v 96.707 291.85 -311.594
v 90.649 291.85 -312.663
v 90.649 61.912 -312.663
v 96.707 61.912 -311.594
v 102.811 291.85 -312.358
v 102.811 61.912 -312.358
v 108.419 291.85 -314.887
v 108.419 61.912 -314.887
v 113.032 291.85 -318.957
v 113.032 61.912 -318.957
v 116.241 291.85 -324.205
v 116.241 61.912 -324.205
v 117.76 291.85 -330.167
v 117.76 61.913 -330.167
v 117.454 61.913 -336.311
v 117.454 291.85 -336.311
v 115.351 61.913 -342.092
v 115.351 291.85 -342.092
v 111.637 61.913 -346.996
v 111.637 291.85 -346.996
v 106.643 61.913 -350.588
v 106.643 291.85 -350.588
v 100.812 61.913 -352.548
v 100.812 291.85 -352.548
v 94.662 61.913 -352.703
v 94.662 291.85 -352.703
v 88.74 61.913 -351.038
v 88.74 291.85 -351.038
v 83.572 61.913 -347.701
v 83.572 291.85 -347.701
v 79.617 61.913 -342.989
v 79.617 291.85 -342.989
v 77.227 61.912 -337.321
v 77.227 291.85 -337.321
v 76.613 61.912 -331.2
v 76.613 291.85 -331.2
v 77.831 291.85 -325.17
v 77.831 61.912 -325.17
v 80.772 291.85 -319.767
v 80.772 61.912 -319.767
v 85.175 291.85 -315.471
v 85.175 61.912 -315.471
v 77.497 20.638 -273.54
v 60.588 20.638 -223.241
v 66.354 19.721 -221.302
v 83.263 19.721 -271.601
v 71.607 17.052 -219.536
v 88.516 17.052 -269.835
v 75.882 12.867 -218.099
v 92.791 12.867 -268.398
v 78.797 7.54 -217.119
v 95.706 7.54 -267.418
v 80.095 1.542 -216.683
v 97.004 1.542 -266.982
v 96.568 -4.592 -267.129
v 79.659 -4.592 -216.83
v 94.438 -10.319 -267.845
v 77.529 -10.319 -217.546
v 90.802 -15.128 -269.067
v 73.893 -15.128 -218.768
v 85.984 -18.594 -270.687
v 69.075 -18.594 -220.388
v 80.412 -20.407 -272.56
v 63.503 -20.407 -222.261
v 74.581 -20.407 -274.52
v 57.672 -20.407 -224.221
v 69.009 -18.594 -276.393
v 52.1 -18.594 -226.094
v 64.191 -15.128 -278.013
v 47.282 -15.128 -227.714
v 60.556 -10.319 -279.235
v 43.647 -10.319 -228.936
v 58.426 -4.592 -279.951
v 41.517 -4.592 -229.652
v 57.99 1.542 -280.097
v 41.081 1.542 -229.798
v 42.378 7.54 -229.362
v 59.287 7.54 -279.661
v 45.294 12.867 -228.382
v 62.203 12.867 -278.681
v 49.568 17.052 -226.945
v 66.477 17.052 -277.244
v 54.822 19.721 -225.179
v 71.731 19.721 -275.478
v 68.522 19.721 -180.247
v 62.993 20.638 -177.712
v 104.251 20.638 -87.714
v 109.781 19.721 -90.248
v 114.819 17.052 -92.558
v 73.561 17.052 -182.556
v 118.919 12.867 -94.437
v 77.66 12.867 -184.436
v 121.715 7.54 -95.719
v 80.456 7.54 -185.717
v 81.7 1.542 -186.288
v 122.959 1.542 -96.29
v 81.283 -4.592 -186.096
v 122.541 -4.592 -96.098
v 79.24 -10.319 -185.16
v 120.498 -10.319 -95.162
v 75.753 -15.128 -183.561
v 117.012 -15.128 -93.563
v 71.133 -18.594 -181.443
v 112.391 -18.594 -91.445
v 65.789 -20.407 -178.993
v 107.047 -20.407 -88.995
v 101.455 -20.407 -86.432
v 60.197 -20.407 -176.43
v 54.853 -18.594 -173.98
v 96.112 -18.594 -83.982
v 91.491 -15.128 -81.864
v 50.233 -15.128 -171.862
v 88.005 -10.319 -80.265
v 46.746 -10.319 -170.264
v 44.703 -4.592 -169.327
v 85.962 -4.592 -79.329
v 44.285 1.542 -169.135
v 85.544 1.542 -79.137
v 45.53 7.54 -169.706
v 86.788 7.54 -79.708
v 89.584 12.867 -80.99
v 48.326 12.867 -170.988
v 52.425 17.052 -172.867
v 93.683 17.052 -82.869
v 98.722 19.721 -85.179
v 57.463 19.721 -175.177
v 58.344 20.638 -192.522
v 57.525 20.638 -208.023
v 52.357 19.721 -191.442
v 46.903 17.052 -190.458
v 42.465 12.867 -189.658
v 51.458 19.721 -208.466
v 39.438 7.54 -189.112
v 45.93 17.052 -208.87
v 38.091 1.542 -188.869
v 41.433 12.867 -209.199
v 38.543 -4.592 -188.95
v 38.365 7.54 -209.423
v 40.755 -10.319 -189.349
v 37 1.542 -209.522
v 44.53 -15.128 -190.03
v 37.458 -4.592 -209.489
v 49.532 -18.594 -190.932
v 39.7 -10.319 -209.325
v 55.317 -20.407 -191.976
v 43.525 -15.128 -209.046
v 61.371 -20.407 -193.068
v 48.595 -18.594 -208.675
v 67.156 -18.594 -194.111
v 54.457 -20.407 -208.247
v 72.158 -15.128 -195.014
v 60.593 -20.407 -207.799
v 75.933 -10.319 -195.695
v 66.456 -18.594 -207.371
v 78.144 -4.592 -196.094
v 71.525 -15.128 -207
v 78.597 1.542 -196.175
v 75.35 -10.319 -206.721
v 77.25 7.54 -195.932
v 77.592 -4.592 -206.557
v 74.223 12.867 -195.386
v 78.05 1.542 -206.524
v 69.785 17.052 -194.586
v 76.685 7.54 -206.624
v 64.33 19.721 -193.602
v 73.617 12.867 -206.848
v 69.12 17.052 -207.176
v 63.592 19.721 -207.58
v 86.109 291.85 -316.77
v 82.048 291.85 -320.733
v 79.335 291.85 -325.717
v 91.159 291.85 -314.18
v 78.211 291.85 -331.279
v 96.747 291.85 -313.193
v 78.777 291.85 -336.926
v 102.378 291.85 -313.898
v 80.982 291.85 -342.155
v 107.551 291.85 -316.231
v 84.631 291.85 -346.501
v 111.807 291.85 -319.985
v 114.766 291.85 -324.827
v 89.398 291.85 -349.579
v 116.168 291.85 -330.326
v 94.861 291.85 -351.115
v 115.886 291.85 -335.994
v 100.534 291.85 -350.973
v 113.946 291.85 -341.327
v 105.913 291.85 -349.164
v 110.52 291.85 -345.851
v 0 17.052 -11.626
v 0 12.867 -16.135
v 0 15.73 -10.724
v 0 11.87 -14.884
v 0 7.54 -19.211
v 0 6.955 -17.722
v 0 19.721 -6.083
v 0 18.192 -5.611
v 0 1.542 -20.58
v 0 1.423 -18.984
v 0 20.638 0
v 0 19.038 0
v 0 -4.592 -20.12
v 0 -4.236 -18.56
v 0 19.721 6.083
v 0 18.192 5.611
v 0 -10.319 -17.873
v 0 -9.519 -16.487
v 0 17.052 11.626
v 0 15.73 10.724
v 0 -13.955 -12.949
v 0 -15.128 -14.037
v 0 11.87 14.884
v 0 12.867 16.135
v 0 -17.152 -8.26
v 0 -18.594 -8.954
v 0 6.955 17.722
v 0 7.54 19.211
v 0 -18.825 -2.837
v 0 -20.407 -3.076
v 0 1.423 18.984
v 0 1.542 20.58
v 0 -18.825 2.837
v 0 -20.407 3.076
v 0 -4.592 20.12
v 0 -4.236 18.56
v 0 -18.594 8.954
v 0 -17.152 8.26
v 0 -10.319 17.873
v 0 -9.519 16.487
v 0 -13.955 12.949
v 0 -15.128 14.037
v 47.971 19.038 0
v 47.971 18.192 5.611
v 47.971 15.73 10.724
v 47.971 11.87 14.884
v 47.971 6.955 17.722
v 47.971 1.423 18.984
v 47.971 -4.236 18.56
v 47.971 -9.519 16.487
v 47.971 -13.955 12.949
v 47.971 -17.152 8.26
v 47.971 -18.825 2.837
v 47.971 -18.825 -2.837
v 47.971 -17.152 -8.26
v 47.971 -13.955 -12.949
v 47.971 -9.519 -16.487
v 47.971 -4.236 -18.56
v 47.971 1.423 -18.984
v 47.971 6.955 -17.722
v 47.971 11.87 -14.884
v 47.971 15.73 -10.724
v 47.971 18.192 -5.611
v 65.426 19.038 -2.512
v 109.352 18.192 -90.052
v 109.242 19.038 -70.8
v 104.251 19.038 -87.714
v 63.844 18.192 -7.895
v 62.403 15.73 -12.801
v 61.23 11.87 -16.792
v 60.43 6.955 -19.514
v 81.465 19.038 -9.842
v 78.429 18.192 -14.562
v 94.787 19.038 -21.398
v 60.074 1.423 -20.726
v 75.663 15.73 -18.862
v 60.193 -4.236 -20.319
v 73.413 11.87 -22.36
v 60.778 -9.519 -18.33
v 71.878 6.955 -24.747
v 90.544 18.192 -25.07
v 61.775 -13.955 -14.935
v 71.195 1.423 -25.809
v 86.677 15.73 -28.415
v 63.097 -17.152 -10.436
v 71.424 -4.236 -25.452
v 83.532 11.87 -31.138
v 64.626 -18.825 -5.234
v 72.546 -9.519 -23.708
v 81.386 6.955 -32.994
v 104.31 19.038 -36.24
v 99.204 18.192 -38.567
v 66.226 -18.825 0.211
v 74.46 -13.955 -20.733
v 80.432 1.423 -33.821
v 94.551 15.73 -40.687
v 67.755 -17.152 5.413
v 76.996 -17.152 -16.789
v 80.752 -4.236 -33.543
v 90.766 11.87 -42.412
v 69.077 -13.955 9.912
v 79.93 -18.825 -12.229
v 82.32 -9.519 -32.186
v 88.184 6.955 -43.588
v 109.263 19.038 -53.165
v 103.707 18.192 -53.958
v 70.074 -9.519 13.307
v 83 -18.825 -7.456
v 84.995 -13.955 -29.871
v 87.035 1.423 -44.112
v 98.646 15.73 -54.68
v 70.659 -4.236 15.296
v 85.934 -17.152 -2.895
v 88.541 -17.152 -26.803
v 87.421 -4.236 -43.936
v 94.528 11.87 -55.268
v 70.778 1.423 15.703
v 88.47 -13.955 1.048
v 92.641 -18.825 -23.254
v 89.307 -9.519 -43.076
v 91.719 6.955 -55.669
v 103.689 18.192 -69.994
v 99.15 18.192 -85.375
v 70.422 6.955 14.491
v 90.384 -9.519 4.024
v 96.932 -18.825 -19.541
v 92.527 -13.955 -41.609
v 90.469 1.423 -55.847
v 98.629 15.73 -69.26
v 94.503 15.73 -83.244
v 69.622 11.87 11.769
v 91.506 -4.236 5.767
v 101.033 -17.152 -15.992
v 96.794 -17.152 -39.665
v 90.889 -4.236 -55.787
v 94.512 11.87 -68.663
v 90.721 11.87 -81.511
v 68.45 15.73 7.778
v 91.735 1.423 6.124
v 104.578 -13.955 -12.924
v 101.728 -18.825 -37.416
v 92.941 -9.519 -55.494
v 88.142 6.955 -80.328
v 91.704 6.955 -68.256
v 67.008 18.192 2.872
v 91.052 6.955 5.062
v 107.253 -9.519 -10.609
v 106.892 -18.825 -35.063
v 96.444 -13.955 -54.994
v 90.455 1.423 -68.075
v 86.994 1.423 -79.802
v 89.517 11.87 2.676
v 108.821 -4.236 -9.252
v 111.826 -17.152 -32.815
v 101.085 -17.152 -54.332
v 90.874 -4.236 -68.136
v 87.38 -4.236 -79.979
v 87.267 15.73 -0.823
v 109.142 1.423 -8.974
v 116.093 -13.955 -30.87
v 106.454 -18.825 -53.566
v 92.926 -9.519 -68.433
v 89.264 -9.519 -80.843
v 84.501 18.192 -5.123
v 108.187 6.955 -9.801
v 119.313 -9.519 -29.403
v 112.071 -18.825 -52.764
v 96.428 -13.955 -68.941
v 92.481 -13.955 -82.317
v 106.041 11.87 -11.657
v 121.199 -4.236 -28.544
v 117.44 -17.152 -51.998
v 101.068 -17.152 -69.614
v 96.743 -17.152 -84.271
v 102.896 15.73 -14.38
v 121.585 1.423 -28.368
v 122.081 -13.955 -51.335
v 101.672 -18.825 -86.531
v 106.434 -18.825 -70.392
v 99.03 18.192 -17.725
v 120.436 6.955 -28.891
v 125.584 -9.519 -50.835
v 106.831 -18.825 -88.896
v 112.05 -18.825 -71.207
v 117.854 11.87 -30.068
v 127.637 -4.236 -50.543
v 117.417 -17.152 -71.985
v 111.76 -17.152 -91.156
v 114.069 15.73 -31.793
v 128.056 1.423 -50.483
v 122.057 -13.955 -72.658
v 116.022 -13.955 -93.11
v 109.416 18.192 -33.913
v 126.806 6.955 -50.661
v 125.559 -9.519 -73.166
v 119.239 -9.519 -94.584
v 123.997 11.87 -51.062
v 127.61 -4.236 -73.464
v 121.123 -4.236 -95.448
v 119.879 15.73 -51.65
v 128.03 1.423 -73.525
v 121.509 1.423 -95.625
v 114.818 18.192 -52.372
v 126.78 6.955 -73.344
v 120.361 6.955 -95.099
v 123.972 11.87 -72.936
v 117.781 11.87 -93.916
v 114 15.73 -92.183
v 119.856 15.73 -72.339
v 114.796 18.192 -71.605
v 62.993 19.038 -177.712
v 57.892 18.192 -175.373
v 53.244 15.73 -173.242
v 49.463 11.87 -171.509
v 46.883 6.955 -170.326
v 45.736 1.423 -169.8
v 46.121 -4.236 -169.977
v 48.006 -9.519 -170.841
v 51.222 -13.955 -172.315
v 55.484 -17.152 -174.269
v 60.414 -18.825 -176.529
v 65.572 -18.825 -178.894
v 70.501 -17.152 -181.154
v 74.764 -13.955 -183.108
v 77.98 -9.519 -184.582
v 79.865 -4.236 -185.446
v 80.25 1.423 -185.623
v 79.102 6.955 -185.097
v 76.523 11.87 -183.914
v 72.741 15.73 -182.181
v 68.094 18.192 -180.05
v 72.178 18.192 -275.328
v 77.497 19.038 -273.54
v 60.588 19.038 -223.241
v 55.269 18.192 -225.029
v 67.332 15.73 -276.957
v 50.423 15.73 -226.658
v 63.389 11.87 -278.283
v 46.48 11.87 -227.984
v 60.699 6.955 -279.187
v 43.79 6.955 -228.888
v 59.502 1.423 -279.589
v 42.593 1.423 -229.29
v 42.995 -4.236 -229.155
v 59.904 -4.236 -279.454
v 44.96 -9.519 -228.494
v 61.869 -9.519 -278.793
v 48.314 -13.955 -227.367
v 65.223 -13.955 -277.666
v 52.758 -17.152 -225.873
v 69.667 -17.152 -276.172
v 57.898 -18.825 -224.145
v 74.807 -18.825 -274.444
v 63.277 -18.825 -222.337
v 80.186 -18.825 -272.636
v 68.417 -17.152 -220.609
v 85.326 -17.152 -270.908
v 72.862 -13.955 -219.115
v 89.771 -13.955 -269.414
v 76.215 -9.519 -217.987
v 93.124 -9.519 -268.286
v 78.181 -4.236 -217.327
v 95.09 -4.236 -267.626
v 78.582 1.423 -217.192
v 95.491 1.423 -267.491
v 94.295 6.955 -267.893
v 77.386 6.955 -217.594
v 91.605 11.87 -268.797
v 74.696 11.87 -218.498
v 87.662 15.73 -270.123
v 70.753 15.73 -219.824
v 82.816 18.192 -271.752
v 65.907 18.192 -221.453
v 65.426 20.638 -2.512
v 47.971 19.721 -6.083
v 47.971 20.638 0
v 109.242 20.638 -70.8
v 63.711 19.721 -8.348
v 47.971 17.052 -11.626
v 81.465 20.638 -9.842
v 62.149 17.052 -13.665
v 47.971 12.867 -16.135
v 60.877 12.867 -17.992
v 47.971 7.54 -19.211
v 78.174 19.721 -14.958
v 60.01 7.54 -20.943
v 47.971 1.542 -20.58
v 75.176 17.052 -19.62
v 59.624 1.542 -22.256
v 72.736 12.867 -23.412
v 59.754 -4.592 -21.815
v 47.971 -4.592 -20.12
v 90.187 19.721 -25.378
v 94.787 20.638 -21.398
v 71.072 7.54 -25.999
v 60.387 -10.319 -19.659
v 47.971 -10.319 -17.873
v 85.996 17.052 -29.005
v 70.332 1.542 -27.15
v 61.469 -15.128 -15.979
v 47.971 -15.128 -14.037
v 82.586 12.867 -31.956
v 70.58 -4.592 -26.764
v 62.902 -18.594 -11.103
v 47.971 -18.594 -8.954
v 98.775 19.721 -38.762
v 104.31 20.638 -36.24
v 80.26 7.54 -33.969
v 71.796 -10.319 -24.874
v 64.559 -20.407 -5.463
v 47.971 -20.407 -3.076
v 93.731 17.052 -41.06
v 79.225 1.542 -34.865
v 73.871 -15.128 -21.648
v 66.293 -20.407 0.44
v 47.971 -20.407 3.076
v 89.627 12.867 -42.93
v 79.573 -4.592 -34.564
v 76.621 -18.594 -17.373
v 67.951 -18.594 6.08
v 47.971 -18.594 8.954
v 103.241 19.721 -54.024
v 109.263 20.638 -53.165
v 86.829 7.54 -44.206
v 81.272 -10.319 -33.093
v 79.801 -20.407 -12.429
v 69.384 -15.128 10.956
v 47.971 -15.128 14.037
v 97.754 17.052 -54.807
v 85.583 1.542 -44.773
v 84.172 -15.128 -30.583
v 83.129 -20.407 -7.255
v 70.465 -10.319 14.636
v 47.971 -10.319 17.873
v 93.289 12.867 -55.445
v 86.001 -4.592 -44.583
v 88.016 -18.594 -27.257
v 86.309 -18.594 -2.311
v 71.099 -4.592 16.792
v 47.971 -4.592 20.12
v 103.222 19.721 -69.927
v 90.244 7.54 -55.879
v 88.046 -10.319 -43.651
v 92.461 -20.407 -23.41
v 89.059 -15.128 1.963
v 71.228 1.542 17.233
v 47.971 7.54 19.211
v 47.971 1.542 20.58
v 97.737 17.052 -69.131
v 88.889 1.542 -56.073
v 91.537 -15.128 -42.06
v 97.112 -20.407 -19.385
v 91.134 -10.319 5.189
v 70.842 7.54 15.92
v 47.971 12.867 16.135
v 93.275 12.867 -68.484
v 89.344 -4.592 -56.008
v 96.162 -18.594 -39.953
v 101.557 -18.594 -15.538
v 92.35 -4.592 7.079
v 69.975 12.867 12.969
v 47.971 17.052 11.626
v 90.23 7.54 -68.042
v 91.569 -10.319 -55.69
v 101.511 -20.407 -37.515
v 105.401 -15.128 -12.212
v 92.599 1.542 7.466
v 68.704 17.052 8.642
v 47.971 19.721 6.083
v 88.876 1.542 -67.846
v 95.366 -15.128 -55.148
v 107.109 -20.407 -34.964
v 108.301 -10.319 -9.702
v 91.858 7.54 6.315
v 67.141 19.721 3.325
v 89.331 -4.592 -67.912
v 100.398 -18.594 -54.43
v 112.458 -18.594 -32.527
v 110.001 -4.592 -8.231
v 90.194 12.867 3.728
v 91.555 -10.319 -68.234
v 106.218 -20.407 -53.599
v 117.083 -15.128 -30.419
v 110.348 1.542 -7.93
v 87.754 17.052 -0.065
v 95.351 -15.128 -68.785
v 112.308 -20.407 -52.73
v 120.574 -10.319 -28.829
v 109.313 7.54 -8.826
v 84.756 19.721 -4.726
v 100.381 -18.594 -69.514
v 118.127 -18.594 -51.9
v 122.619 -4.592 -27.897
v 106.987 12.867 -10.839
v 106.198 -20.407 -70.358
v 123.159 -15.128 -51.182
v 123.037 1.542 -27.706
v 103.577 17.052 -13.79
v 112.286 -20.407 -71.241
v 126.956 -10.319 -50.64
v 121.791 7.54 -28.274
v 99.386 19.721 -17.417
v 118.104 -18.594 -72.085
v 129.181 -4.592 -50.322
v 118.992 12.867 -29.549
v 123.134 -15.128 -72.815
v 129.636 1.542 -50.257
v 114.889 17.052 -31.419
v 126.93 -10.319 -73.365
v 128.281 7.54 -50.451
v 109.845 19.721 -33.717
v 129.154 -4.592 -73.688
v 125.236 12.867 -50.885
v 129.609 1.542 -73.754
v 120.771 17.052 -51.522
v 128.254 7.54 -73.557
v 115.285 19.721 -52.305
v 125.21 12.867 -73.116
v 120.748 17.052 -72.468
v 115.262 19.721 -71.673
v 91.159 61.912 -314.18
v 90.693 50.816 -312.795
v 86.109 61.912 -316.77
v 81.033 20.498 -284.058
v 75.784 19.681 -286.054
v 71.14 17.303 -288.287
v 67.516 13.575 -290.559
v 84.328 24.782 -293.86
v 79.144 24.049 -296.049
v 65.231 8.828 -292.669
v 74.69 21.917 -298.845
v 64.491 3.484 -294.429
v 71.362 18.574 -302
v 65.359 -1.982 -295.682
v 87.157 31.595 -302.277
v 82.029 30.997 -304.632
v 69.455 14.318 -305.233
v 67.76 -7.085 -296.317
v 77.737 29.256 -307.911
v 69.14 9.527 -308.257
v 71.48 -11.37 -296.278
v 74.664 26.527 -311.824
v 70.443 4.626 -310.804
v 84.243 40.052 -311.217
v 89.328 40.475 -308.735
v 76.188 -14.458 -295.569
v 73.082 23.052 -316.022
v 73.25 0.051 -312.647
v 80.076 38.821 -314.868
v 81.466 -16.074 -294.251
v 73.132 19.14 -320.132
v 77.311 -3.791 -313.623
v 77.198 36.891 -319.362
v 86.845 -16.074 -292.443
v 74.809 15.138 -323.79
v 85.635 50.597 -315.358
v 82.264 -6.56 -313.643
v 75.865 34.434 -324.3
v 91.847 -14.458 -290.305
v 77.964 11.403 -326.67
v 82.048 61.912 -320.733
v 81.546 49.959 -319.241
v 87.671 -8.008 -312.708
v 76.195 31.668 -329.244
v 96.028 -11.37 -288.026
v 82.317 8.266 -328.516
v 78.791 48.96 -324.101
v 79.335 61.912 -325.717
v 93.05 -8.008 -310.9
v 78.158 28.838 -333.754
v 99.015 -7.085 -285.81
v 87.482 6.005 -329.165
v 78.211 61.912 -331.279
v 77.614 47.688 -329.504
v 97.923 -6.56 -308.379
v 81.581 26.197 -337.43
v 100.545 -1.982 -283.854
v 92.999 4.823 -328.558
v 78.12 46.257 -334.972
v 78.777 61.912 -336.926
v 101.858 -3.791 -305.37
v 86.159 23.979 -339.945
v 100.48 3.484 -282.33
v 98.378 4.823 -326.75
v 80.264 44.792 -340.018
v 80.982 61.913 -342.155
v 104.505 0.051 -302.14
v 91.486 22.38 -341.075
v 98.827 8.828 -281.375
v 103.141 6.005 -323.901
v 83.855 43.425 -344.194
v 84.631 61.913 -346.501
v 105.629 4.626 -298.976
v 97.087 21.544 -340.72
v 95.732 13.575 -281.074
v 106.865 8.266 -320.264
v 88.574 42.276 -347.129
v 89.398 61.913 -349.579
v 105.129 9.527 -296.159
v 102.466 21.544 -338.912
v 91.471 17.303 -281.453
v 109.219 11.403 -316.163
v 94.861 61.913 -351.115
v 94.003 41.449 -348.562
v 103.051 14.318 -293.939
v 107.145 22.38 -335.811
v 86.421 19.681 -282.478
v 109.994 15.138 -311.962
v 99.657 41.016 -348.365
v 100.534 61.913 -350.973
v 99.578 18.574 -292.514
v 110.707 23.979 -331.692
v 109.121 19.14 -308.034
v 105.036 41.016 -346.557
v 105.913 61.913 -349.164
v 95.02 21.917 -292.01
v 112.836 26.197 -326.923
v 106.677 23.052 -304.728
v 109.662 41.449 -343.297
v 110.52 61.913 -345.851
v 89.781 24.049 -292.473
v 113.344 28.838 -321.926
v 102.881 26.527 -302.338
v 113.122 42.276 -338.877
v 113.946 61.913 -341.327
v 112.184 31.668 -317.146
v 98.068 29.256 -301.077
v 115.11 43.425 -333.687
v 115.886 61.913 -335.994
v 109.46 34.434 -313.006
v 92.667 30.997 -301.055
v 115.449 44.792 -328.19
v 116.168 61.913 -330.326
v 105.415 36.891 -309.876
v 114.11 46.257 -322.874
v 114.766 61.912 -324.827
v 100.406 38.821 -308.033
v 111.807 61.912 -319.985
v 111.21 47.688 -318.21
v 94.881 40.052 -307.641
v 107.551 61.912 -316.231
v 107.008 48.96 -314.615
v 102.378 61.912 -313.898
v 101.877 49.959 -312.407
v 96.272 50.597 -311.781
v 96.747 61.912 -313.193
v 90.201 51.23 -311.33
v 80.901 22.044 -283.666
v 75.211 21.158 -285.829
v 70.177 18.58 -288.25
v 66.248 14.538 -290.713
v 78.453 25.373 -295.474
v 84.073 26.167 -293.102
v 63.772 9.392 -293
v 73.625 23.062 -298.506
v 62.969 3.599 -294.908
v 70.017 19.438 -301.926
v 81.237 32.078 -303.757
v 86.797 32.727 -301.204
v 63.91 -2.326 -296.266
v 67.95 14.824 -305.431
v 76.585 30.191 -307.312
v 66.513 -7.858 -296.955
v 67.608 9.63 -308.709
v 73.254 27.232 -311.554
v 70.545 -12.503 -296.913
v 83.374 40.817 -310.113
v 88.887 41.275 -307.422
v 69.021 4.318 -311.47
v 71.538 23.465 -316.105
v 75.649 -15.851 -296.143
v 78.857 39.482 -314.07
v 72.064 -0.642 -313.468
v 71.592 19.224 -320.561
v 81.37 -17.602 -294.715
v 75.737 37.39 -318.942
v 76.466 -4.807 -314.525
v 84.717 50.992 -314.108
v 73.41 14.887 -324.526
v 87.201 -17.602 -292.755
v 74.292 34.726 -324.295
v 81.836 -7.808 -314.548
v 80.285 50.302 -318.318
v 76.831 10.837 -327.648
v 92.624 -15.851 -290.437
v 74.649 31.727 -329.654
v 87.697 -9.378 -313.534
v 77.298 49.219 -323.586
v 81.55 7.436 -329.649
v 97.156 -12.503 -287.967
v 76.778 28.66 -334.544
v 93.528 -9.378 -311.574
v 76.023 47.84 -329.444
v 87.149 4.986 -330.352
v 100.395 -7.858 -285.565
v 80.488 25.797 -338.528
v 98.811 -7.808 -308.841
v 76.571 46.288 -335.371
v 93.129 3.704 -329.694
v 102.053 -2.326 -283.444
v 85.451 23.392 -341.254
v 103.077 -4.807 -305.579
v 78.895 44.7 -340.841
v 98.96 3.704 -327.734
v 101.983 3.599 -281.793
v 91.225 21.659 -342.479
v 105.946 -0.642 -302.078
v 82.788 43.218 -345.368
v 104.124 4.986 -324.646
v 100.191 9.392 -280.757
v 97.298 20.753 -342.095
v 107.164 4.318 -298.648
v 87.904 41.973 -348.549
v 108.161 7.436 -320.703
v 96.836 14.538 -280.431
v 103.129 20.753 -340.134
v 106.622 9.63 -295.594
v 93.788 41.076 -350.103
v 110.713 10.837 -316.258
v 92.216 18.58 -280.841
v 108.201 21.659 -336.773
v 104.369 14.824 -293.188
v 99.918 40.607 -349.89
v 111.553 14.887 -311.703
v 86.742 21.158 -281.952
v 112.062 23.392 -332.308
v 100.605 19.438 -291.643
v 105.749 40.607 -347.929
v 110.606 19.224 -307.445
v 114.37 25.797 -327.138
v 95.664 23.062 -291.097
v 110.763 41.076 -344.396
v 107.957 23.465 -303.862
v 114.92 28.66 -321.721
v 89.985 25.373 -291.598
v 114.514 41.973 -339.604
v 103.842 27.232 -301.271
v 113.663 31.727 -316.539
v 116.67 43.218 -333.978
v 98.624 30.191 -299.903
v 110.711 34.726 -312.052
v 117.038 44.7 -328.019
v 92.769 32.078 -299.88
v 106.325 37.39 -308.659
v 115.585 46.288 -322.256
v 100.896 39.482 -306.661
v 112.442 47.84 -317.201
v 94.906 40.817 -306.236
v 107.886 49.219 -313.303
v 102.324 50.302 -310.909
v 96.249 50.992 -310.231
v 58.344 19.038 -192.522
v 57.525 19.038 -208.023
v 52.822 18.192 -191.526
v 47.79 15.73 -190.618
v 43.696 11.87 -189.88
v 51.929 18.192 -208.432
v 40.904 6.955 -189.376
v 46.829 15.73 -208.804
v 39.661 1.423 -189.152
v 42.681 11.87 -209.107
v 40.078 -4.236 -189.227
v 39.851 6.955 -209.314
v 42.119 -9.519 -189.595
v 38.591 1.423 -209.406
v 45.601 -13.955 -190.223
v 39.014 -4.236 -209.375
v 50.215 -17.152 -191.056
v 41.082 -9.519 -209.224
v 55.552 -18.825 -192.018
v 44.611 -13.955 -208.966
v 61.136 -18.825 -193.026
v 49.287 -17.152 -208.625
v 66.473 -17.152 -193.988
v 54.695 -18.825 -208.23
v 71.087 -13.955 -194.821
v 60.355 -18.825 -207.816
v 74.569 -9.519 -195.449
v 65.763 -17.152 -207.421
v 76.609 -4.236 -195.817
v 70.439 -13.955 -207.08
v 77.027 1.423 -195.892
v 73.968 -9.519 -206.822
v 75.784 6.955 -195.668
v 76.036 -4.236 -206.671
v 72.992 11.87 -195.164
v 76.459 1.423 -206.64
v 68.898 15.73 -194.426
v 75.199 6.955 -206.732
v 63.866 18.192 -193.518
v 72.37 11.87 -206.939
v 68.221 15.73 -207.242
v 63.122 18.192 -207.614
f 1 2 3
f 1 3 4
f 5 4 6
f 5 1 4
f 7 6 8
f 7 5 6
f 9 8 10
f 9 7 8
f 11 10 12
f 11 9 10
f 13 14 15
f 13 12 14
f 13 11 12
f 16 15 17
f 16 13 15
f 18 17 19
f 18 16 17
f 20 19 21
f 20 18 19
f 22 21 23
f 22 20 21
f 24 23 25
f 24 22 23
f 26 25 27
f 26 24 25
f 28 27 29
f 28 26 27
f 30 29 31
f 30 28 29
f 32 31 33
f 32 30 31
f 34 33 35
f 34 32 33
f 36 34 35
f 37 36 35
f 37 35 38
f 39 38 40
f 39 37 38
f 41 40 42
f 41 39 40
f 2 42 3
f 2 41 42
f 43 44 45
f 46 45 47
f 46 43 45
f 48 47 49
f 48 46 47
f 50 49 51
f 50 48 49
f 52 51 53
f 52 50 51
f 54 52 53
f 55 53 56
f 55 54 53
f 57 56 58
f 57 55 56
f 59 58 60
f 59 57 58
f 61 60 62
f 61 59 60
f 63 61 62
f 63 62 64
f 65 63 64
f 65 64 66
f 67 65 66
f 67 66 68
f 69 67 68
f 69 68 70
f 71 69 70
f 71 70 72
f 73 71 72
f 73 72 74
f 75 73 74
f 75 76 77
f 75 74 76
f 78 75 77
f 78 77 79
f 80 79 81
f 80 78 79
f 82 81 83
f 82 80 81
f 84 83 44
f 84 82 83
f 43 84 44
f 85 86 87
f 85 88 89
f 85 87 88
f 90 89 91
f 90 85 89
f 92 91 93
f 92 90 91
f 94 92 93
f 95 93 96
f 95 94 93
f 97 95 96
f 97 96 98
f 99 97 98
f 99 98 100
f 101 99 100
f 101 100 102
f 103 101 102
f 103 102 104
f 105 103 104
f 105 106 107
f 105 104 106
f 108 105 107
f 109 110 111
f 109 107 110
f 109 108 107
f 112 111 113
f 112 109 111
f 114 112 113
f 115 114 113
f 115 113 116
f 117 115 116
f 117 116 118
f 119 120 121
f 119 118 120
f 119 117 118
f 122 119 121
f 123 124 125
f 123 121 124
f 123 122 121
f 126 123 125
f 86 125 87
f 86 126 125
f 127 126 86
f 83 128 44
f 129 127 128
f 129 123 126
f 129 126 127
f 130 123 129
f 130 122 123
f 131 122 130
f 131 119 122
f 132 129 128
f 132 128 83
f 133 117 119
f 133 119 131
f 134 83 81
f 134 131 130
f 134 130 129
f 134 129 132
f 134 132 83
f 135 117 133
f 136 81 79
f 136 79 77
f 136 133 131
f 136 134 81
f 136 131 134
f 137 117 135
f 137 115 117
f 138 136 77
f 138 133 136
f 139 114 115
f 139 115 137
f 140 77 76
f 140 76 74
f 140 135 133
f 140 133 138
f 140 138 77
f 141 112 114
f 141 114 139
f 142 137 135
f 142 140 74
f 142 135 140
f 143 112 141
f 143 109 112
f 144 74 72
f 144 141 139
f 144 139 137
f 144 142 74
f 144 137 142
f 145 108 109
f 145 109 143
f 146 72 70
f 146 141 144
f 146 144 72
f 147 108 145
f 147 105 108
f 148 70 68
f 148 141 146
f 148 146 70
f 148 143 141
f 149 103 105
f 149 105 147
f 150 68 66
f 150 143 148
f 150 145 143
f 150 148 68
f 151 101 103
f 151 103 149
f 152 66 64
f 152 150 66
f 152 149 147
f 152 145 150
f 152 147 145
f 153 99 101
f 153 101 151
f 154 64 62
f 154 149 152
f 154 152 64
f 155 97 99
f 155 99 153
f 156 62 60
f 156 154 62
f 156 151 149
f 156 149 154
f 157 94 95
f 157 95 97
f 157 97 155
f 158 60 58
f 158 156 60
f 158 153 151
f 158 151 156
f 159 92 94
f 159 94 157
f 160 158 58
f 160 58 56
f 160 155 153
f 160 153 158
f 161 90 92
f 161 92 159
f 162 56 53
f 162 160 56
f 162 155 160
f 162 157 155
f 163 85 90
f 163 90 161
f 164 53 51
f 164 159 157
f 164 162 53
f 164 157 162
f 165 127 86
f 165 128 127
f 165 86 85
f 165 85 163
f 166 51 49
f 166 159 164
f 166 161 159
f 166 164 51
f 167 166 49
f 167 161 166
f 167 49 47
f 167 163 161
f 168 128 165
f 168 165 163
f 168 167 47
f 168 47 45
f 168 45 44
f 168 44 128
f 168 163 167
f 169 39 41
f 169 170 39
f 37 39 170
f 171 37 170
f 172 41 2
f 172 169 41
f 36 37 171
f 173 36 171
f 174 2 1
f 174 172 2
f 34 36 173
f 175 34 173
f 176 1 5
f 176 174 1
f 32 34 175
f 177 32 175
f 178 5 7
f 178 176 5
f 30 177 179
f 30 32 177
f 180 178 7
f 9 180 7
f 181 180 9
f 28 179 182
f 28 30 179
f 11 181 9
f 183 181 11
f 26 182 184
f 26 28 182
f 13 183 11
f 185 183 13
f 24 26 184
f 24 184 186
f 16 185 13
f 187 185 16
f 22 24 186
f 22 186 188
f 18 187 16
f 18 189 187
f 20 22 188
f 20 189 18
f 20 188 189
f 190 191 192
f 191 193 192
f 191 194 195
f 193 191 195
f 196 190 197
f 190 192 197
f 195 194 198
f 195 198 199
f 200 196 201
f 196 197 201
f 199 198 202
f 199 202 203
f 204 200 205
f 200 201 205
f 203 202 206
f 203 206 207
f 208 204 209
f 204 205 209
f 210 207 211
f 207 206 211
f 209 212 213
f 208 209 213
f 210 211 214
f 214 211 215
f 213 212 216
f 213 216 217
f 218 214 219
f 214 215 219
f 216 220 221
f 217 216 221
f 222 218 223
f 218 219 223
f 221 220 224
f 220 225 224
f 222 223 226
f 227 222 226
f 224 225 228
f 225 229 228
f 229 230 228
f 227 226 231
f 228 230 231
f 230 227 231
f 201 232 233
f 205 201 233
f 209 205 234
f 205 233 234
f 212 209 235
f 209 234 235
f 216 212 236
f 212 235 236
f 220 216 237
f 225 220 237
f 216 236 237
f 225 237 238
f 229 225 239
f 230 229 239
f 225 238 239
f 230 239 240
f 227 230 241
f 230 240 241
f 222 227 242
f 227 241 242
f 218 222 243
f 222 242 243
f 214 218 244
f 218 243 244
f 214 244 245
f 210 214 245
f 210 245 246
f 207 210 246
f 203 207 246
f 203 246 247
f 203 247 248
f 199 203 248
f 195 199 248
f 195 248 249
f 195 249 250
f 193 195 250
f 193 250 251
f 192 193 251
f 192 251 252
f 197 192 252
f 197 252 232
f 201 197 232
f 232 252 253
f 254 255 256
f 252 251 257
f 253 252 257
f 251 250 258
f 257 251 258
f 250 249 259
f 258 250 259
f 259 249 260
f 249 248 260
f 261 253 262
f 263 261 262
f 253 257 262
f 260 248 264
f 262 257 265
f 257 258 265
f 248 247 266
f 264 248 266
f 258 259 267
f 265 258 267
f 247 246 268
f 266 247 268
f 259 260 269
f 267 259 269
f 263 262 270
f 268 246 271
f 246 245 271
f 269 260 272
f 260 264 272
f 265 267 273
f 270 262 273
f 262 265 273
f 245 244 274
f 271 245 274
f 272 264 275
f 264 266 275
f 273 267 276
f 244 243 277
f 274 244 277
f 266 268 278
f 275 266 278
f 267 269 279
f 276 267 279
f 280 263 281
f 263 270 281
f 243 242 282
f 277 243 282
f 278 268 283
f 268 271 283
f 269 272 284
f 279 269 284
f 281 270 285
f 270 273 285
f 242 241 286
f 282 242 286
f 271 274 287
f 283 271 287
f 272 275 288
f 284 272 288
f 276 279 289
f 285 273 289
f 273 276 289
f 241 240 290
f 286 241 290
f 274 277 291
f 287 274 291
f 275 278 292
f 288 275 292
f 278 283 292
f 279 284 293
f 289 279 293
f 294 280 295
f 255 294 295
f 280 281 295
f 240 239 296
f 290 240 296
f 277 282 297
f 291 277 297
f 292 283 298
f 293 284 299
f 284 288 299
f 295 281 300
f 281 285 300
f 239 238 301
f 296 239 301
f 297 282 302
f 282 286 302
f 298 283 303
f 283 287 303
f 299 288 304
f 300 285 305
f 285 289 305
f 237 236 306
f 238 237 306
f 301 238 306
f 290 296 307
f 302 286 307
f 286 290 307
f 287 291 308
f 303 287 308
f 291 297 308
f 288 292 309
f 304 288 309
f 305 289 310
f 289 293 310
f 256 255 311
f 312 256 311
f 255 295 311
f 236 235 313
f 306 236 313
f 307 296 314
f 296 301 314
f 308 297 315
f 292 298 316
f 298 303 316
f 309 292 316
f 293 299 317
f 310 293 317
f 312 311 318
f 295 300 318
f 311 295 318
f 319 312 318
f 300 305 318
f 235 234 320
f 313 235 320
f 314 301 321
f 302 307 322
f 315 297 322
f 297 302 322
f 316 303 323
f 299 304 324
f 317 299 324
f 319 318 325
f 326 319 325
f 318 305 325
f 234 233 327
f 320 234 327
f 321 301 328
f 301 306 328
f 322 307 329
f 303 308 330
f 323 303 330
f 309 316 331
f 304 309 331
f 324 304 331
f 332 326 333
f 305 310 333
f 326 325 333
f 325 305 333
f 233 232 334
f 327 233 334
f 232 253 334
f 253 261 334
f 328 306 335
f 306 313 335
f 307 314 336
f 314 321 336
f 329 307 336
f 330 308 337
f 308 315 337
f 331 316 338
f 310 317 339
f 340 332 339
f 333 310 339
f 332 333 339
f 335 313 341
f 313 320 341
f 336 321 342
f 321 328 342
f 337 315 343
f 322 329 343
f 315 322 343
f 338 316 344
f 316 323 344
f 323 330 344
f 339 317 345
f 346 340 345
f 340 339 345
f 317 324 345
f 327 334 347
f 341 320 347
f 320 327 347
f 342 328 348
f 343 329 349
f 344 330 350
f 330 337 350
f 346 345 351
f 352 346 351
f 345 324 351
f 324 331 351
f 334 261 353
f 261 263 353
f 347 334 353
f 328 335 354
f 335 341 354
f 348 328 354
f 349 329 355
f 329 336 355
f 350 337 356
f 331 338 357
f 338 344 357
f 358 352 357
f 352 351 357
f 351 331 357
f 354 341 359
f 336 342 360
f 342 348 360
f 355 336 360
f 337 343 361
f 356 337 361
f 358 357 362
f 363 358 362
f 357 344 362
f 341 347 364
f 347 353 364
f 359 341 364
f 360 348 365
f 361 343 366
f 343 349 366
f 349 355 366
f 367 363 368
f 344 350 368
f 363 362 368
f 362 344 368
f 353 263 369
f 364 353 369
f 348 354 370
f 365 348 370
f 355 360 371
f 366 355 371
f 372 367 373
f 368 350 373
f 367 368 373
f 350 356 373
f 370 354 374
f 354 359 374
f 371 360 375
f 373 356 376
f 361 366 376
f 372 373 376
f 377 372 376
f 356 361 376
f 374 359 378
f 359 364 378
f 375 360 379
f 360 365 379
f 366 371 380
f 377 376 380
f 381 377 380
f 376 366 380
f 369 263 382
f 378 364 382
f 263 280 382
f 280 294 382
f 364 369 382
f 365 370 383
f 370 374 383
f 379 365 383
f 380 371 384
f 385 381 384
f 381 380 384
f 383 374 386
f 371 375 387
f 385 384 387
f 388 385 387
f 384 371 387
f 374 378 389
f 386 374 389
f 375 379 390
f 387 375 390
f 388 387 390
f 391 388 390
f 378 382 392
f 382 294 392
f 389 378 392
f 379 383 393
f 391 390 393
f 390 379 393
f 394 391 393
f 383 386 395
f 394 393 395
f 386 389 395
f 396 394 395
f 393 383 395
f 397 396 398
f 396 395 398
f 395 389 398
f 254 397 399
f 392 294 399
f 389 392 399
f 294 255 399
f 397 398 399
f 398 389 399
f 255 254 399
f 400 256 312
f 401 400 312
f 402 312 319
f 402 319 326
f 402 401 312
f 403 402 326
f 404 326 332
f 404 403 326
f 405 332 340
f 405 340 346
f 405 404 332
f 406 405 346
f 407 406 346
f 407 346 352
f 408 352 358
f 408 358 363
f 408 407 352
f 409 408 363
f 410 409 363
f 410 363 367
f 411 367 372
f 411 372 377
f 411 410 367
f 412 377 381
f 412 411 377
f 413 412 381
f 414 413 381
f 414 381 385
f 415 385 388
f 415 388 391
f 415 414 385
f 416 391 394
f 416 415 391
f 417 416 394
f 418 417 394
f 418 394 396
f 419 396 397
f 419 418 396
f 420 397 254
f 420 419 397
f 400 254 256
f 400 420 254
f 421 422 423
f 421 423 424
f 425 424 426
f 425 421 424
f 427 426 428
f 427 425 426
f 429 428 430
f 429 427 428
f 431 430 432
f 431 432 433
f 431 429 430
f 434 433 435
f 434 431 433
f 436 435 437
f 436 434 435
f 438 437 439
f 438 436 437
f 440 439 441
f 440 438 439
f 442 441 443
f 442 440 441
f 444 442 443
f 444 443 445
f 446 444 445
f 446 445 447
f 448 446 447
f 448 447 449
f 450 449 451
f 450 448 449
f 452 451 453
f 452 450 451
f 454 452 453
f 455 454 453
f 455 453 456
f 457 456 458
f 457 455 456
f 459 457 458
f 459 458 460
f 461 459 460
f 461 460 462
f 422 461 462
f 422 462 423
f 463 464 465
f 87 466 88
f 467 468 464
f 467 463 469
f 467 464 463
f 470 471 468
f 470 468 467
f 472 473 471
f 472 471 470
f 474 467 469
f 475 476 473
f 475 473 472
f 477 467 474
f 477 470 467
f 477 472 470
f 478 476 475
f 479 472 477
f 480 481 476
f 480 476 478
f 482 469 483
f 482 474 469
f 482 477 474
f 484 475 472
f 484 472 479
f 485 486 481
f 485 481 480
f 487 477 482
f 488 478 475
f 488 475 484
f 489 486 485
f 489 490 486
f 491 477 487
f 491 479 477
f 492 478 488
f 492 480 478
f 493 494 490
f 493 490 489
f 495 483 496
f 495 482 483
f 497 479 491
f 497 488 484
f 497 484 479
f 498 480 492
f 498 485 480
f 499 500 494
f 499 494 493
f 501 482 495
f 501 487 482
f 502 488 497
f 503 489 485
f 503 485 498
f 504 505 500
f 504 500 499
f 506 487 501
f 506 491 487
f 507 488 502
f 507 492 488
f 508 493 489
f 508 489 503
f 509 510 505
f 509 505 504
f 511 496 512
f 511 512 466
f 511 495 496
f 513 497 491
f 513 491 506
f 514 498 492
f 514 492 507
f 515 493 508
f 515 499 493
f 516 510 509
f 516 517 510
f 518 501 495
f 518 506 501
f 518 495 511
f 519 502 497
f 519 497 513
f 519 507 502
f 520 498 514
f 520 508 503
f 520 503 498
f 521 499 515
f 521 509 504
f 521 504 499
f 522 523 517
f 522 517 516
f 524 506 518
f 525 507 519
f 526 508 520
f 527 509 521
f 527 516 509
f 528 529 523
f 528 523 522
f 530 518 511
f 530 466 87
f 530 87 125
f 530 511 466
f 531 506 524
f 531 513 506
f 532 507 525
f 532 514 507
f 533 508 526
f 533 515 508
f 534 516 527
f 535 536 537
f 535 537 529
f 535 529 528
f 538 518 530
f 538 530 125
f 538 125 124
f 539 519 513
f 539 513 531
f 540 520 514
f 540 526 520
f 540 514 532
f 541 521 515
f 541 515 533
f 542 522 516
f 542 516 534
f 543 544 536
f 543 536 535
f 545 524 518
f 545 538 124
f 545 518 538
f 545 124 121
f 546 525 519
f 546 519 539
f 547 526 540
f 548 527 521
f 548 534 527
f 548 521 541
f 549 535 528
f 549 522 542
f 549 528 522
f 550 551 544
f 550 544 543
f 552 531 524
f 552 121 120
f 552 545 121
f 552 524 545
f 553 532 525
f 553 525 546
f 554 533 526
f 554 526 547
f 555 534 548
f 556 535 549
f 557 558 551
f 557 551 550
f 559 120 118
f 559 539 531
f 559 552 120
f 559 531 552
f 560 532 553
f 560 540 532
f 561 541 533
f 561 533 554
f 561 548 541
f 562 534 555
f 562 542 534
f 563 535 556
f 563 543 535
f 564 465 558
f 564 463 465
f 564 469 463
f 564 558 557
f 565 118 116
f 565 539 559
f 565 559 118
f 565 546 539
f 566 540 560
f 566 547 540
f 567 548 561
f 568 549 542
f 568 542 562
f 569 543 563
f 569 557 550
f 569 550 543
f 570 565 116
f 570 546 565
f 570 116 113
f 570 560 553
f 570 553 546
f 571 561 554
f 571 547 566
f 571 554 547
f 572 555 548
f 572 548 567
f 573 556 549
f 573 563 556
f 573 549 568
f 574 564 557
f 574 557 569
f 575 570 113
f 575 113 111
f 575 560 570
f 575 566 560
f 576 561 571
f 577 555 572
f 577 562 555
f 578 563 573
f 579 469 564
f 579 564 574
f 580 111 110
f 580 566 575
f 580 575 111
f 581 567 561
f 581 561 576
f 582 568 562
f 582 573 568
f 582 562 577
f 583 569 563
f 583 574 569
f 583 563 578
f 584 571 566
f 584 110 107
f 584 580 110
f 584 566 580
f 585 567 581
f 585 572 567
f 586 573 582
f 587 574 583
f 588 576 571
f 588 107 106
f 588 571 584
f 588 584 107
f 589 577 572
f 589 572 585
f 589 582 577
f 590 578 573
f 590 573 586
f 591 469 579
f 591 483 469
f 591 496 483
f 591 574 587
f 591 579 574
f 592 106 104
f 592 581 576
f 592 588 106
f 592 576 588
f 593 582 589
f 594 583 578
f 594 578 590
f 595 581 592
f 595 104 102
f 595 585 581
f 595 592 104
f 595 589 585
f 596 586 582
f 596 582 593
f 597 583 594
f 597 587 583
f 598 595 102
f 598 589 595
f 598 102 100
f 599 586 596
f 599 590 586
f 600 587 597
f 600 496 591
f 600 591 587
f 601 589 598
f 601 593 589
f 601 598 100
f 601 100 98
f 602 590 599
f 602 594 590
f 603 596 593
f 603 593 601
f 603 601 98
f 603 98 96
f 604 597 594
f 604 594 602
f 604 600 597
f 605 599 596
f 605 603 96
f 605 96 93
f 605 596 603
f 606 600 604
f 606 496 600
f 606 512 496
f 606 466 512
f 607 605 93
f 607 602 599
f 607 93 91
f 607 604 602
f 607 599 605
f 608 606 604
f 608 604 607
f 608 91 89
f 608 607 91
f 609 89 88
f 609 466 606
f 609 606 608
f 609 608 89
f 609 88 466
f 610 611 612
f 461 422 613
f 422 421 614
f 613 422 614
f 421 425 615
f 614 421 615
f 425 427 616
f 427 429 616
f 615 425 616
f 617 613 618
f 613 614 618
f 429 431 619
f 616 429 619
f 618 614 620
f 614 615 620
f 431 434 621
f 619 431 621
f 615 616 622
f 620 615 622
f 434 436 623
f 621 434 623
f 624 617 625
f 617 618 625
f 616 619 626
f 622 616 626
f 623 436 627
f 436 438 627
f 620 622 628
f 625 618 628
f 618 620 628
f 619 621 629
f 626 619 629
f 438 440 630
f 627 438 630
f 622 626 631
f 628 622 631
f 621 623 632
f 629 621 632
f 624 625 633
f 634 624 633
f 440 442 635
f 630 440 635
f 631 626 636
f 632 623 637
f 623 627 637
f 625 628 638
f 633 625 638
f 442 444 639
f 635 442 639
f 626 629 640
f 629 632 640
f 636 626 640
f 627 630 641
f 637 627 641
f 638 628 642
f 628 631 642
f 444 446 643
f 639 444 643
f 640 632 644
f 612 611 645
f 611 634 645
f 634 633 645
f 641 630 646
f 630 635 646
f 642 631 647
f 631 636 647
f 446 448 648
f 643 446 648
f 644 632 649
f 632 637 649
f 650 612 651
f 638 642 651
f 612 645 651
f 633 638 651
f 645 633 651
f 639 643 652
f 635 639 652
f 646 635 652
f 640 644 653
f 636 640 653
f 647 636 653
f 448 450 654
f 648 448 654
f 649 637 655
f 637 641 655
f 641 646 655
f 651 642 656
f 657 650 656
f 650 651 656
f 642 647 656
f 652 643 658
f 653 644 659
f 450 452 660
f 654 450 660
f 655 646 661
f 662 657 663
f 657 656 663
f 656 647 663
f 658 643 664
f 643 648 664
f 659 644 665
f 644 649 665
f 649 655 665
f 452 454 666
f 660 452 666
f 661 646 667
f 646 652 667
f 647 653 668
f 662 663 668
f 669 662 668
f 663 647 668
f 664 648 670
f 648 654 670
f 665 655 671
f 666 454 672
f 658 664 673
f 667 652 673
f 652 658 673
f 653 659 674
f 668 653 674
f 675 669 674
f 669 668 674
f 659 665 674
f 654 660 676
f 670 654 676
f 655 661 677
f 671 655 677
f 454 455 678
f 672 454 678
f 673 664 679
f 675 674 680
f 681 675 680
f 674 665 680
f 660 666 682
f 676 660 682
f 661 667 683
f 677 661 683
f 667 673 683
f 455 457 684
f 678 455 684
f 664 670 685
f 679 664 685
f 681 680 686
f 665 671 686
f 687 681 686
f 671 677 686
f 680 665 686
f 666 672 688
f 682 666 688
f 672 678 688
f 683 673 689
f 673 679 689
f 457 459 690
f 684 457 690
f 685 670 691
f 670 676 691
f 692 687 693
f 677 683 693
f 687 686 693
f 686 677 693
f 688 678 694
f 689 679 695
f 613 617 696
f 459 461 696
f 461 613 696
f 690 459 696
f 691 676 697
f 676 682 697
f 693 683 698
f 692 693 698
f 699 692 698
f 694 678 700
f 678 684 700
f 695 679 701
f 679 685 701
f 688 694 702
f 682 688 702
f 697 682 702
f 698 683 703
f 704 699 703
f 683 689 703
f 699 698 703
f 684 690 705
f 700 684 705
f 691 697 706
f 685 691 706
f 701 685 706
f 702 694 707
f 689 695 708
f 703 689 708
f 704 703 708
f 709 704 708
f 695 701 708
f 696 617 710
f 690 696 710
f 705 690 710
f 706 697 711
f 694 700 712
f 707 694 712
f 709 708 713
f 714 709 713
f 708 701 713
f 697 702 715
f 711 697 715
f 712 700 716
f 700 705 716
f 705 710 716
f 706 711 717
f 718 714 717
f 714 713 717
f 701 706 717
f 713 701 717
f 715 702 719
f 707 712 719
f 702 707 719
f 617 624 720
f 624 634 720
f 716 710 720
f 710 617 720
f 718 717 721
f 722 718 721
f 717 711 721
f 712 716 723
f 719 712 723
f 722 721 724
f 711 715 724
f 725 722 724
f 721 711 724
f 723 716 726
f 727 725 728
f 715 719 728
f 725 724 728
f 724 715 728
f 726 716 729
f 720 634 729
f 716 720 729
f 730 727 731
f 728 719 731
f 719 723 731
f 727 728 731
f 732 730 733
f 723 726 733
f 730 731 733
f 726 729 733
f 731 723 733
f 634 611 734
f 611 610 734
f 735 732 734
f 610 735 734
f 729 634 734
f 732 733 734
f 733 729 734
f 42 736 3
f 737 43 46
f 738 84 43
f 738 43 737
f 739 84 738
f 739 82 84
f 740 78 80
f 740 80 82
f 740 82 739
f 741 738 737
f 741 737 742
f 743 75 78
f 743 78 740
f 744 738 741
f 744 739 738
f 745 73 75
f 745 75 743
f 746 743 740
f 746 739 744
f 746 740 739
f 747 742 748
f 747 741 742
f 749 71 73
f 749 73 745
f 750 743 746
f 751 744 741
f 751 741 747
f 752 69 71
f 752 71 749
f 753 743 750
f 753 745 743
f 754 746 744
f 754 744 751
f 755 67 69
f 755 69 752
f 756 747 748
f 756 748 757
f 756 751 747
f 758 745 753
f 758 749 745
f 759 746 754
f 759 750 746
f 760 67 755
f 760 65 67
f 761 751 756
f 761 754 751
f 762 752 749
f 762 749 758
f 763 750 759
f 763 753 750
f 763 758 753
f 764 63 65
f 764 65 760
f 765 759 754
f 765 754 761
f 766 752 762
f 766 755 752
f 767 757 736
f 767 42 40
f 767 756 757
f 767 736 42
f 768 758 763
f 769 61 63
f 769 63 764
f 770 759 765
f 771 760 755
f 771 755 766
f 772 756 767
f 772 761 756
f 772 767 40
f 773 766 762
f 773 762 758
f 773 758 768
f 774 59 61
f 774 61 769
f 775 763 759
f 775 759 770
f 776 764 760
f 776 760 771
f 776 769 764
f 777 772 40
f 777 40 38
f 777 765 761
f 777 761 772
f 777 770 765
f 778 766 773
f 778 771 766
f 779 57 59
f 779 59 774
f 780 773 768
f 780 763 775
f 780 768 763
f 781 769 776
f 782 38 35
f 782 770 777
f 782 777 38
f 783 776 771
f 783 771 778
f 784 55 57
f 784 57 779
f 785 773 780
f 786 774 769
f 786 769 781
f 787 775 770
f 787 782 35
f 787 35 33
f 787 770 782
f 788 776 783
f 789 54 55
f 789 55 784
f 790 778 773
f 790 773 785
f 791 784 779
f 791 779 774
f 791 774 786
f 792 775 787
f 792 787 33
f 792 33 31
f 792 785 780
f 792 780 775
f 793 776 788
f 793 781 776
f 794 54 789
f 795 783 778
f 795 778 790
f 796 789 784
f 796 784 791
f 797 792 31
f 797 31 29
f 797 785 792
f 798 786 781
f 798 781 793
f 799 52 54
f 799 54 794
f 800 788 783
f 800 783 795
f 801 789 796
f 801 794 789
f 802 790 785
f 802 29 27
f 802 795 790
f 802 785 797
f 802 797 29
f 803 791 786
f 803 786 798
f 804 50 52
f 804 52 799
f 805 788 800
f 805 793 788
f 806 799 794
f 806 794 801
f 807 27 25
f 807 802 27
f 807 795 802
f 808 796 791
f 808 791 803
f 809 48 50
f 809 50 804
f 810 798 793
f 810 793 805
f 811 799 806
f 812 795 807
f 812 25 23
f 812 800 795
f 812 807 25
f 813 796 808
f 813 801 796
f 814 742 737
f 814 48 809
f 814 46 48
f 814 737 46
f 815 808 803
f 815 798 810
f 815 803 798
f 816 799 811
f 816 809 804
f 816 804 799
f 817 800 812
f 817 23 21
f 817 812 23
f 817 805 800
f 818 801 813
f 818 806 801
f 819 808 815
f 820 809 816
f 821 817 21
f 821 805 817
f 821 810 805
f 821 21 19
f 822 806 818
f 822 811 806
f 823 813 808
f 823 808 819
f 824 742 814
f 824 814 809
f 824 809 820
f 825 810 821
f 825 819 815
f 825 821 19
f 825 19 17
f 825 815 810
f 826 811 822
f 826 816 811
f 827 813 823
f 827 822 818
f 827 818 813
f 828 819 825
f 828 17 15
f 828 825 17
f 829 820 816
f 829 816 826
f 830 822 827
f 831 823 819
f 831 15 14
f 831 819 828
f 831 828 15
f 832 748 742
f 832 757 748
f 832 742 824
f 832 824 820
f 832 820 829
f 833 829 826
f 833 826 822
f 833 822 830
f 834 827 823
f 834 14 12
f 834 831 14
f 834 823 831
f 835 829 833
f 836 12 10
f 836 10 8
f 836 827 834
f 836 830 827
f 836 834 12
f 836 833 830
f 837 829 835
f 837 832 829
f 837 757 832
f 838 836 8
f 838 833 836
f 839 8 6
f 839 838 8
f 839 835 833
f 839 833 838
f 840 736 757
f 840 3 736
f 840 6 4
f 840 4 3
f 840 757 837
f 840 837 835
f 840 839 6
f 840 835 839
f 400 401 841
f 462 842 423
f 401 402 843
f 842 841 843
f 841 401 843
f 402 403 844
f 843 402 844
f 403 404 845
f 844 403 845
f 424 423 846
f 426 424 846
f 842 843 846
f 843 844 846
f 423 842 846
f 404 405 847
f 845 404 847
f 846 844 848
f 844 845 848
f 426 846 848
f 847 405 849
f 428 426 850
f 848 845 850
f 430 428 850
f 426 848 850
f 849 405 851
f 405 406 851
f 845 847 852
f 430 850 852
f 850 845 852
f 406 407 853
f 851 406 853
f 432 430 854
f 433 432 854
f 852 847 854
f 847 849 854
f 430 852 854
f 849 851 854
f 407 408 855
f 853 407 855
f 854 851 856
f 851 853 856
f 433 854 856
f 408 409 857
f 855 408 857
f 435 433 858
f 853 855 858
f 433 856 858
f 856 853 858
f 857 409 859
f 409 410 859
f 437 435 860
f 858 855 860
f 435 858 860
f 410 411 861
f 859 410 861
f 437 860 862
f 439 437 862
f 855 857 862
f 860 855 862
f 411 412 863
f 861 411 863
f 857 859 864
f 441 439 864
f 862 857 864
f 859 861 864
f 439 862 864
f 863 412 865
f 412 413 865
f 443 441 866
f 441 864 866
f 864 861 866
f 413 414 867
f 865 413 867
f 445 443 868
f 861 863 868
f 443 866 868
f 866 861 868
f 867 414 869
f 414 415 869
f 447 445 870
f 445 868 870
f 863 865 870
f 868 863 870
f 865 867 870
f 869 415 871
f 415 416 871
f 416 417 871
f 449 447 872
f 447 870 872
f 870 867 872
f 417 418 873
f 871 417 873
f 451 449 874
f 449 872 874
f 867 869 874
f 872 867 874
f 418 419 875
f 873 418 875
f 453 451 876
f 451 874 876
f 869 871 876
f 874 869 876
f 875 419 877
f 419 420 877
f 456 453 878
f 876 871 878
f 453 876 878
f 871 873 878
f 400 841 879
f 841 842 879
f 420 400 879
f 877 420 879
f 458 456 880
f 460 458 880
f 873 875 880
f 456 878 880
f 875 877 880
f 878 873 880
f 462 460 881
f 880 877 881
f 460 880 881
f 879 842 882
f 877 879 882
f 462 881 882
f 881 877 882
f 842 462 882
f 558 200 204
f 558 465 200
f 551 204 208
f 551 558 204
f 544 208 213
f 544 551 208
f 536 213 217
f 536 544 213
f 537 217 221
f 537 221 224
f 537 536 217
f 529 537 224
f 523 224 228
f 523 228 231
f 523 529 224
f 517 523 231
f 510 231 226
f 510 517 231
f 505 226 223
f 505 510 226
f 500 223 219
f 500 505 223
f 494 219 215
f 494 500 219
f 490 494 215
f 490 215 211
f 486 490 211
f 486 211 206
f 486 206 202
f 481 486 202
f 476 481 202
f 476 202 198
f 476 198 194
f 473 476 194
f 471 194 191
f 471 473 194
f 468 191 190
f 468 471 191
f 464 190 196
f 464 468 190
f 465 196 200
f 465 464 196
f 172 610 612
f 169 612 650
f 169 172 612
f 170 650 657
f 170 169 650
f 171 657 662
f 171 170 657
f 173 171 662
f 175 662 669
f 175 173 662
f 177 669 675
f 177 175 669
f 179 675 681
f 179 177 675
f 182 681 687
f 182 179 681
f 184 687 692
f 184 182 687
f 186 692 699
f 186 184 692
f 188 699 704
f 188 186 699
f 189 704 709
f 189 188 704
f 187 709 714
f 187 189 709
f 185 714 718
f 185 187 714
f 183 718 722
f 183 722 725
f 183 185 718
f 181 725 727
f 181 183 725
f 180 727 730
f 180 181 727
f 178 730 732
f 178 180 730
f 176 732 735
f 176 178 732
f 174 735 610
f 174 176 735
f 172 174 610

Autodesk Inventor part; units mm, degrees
sketch "Sketch1" plane through (0, 0, 0) normal (1, 0, 0) x (0, 1, 0)
  line L0 (0, 0) -> (0, -200)
  line L1 (0, -200) -> (0, -332.225)
  line L2 (0, -332.225) -> (291.85, -332.225)
  line L3 (0, 0) -> (0, -144.4625) construction
  line L4 (0, -144.4625) -> (0, -52.775) construction
  line L5 (0, -52.775) -> (0, -97.225) construction
  line L6 (0, -97.225) -> (291.85, -97.225) construction
  dimension "d0" = 332.225
  dimension "d1" = 0
  dimension "d4" = 200
  dimension "d5" = 291.85
  dimension "d6" = 144.4625
  dimension "d7" = 97.225
  dimension "d8" = 52.775
ref_plane "Work Plane1" through (144.4625, 0, 0) normal (1, 0, 0) x (0, 1, 0)
ref_plane "Work Plane2" through (52.775, 0, 0) normal (1, 0, 0) x (0, 1, 0)
ref_plane "Work Plane3" through (97.225, 0, 0) normal (1, 0, 0) x (0, 1, 0)
sketch "Sketch2" plane through (144.4625, 0, 0) normal (1, 0, 0) x (0, 1, 0)
  point P0 (0, 0)
  point P1 (0, 0)
sketch "Sketch3" plane through (52.775, 0, 0) normal (1, 0, 0) x (0, 1, 0)
  point P0 (0, 0)
  point P1 (0, -200)
  point P2 (0, -332.225)
sketch "Sketch4" plane through (97.225, 0, 0) normal (1, 0, 0) x (0, 1, 0)
  point P0 (0, 0)
  point P1 (291.85, -332.225)
  point P2 (0, -332.225)
sketch "Sketch5" plane through (0, 0, 0) normal (1, 0, 0) x (0, 1, 0)
  circle A0 centre (0, 0) radius 20.6375
  circle A1 centre (0, 0) radius 19.0375
  dimension "d15" = 1.6
  dimension "d17" = 41.275
sketch3d "3D Sketch1"
  line L0 (0, 0, 0) -> (47.9711, 0, 0)
  arc A0 (47.9711, 0, 0) -> (104.2514, 0, -87.7135) centre (47.9711, 0, -61.9125) ccw
  line L1 (104.2514, 0, -87.7135) -> (62.9928, 0, -177.7116)
  arc A1 (62.9928, 0, -177.7116) -> (60.5878, 0, -223.2408) centre (119.2731, 0, -203.5126) ccw
  line L2 (60.5878, 0, -223.2408) -> (77.4968, 0, -273.5398)
  arc A2 (77.4968, 0, -273.5398) -> (97.225, 61.9125, -332.225) centre (77.4968, 61.9125, -273.5398) ccw
  line L3 (97.225, 61.9125, -332.225) -> (97.225, 291.85, -332.225)
  dimension "d14" = 61.9125
  dimension "d12" = 61.9125
  dimension "d13" = 61.9125
sweep "Sweep1" add profiles "Sketch5" path "3D Sketch1"
equation "\"d14\" = d12"
equation "\"d13\" = d12"
equation "\"d9\" = d6"
equation "\"d10\" = d8"
equation "\"d11\" = d7"
properties part number "exhaust header right pipe 3" material "Steel"
